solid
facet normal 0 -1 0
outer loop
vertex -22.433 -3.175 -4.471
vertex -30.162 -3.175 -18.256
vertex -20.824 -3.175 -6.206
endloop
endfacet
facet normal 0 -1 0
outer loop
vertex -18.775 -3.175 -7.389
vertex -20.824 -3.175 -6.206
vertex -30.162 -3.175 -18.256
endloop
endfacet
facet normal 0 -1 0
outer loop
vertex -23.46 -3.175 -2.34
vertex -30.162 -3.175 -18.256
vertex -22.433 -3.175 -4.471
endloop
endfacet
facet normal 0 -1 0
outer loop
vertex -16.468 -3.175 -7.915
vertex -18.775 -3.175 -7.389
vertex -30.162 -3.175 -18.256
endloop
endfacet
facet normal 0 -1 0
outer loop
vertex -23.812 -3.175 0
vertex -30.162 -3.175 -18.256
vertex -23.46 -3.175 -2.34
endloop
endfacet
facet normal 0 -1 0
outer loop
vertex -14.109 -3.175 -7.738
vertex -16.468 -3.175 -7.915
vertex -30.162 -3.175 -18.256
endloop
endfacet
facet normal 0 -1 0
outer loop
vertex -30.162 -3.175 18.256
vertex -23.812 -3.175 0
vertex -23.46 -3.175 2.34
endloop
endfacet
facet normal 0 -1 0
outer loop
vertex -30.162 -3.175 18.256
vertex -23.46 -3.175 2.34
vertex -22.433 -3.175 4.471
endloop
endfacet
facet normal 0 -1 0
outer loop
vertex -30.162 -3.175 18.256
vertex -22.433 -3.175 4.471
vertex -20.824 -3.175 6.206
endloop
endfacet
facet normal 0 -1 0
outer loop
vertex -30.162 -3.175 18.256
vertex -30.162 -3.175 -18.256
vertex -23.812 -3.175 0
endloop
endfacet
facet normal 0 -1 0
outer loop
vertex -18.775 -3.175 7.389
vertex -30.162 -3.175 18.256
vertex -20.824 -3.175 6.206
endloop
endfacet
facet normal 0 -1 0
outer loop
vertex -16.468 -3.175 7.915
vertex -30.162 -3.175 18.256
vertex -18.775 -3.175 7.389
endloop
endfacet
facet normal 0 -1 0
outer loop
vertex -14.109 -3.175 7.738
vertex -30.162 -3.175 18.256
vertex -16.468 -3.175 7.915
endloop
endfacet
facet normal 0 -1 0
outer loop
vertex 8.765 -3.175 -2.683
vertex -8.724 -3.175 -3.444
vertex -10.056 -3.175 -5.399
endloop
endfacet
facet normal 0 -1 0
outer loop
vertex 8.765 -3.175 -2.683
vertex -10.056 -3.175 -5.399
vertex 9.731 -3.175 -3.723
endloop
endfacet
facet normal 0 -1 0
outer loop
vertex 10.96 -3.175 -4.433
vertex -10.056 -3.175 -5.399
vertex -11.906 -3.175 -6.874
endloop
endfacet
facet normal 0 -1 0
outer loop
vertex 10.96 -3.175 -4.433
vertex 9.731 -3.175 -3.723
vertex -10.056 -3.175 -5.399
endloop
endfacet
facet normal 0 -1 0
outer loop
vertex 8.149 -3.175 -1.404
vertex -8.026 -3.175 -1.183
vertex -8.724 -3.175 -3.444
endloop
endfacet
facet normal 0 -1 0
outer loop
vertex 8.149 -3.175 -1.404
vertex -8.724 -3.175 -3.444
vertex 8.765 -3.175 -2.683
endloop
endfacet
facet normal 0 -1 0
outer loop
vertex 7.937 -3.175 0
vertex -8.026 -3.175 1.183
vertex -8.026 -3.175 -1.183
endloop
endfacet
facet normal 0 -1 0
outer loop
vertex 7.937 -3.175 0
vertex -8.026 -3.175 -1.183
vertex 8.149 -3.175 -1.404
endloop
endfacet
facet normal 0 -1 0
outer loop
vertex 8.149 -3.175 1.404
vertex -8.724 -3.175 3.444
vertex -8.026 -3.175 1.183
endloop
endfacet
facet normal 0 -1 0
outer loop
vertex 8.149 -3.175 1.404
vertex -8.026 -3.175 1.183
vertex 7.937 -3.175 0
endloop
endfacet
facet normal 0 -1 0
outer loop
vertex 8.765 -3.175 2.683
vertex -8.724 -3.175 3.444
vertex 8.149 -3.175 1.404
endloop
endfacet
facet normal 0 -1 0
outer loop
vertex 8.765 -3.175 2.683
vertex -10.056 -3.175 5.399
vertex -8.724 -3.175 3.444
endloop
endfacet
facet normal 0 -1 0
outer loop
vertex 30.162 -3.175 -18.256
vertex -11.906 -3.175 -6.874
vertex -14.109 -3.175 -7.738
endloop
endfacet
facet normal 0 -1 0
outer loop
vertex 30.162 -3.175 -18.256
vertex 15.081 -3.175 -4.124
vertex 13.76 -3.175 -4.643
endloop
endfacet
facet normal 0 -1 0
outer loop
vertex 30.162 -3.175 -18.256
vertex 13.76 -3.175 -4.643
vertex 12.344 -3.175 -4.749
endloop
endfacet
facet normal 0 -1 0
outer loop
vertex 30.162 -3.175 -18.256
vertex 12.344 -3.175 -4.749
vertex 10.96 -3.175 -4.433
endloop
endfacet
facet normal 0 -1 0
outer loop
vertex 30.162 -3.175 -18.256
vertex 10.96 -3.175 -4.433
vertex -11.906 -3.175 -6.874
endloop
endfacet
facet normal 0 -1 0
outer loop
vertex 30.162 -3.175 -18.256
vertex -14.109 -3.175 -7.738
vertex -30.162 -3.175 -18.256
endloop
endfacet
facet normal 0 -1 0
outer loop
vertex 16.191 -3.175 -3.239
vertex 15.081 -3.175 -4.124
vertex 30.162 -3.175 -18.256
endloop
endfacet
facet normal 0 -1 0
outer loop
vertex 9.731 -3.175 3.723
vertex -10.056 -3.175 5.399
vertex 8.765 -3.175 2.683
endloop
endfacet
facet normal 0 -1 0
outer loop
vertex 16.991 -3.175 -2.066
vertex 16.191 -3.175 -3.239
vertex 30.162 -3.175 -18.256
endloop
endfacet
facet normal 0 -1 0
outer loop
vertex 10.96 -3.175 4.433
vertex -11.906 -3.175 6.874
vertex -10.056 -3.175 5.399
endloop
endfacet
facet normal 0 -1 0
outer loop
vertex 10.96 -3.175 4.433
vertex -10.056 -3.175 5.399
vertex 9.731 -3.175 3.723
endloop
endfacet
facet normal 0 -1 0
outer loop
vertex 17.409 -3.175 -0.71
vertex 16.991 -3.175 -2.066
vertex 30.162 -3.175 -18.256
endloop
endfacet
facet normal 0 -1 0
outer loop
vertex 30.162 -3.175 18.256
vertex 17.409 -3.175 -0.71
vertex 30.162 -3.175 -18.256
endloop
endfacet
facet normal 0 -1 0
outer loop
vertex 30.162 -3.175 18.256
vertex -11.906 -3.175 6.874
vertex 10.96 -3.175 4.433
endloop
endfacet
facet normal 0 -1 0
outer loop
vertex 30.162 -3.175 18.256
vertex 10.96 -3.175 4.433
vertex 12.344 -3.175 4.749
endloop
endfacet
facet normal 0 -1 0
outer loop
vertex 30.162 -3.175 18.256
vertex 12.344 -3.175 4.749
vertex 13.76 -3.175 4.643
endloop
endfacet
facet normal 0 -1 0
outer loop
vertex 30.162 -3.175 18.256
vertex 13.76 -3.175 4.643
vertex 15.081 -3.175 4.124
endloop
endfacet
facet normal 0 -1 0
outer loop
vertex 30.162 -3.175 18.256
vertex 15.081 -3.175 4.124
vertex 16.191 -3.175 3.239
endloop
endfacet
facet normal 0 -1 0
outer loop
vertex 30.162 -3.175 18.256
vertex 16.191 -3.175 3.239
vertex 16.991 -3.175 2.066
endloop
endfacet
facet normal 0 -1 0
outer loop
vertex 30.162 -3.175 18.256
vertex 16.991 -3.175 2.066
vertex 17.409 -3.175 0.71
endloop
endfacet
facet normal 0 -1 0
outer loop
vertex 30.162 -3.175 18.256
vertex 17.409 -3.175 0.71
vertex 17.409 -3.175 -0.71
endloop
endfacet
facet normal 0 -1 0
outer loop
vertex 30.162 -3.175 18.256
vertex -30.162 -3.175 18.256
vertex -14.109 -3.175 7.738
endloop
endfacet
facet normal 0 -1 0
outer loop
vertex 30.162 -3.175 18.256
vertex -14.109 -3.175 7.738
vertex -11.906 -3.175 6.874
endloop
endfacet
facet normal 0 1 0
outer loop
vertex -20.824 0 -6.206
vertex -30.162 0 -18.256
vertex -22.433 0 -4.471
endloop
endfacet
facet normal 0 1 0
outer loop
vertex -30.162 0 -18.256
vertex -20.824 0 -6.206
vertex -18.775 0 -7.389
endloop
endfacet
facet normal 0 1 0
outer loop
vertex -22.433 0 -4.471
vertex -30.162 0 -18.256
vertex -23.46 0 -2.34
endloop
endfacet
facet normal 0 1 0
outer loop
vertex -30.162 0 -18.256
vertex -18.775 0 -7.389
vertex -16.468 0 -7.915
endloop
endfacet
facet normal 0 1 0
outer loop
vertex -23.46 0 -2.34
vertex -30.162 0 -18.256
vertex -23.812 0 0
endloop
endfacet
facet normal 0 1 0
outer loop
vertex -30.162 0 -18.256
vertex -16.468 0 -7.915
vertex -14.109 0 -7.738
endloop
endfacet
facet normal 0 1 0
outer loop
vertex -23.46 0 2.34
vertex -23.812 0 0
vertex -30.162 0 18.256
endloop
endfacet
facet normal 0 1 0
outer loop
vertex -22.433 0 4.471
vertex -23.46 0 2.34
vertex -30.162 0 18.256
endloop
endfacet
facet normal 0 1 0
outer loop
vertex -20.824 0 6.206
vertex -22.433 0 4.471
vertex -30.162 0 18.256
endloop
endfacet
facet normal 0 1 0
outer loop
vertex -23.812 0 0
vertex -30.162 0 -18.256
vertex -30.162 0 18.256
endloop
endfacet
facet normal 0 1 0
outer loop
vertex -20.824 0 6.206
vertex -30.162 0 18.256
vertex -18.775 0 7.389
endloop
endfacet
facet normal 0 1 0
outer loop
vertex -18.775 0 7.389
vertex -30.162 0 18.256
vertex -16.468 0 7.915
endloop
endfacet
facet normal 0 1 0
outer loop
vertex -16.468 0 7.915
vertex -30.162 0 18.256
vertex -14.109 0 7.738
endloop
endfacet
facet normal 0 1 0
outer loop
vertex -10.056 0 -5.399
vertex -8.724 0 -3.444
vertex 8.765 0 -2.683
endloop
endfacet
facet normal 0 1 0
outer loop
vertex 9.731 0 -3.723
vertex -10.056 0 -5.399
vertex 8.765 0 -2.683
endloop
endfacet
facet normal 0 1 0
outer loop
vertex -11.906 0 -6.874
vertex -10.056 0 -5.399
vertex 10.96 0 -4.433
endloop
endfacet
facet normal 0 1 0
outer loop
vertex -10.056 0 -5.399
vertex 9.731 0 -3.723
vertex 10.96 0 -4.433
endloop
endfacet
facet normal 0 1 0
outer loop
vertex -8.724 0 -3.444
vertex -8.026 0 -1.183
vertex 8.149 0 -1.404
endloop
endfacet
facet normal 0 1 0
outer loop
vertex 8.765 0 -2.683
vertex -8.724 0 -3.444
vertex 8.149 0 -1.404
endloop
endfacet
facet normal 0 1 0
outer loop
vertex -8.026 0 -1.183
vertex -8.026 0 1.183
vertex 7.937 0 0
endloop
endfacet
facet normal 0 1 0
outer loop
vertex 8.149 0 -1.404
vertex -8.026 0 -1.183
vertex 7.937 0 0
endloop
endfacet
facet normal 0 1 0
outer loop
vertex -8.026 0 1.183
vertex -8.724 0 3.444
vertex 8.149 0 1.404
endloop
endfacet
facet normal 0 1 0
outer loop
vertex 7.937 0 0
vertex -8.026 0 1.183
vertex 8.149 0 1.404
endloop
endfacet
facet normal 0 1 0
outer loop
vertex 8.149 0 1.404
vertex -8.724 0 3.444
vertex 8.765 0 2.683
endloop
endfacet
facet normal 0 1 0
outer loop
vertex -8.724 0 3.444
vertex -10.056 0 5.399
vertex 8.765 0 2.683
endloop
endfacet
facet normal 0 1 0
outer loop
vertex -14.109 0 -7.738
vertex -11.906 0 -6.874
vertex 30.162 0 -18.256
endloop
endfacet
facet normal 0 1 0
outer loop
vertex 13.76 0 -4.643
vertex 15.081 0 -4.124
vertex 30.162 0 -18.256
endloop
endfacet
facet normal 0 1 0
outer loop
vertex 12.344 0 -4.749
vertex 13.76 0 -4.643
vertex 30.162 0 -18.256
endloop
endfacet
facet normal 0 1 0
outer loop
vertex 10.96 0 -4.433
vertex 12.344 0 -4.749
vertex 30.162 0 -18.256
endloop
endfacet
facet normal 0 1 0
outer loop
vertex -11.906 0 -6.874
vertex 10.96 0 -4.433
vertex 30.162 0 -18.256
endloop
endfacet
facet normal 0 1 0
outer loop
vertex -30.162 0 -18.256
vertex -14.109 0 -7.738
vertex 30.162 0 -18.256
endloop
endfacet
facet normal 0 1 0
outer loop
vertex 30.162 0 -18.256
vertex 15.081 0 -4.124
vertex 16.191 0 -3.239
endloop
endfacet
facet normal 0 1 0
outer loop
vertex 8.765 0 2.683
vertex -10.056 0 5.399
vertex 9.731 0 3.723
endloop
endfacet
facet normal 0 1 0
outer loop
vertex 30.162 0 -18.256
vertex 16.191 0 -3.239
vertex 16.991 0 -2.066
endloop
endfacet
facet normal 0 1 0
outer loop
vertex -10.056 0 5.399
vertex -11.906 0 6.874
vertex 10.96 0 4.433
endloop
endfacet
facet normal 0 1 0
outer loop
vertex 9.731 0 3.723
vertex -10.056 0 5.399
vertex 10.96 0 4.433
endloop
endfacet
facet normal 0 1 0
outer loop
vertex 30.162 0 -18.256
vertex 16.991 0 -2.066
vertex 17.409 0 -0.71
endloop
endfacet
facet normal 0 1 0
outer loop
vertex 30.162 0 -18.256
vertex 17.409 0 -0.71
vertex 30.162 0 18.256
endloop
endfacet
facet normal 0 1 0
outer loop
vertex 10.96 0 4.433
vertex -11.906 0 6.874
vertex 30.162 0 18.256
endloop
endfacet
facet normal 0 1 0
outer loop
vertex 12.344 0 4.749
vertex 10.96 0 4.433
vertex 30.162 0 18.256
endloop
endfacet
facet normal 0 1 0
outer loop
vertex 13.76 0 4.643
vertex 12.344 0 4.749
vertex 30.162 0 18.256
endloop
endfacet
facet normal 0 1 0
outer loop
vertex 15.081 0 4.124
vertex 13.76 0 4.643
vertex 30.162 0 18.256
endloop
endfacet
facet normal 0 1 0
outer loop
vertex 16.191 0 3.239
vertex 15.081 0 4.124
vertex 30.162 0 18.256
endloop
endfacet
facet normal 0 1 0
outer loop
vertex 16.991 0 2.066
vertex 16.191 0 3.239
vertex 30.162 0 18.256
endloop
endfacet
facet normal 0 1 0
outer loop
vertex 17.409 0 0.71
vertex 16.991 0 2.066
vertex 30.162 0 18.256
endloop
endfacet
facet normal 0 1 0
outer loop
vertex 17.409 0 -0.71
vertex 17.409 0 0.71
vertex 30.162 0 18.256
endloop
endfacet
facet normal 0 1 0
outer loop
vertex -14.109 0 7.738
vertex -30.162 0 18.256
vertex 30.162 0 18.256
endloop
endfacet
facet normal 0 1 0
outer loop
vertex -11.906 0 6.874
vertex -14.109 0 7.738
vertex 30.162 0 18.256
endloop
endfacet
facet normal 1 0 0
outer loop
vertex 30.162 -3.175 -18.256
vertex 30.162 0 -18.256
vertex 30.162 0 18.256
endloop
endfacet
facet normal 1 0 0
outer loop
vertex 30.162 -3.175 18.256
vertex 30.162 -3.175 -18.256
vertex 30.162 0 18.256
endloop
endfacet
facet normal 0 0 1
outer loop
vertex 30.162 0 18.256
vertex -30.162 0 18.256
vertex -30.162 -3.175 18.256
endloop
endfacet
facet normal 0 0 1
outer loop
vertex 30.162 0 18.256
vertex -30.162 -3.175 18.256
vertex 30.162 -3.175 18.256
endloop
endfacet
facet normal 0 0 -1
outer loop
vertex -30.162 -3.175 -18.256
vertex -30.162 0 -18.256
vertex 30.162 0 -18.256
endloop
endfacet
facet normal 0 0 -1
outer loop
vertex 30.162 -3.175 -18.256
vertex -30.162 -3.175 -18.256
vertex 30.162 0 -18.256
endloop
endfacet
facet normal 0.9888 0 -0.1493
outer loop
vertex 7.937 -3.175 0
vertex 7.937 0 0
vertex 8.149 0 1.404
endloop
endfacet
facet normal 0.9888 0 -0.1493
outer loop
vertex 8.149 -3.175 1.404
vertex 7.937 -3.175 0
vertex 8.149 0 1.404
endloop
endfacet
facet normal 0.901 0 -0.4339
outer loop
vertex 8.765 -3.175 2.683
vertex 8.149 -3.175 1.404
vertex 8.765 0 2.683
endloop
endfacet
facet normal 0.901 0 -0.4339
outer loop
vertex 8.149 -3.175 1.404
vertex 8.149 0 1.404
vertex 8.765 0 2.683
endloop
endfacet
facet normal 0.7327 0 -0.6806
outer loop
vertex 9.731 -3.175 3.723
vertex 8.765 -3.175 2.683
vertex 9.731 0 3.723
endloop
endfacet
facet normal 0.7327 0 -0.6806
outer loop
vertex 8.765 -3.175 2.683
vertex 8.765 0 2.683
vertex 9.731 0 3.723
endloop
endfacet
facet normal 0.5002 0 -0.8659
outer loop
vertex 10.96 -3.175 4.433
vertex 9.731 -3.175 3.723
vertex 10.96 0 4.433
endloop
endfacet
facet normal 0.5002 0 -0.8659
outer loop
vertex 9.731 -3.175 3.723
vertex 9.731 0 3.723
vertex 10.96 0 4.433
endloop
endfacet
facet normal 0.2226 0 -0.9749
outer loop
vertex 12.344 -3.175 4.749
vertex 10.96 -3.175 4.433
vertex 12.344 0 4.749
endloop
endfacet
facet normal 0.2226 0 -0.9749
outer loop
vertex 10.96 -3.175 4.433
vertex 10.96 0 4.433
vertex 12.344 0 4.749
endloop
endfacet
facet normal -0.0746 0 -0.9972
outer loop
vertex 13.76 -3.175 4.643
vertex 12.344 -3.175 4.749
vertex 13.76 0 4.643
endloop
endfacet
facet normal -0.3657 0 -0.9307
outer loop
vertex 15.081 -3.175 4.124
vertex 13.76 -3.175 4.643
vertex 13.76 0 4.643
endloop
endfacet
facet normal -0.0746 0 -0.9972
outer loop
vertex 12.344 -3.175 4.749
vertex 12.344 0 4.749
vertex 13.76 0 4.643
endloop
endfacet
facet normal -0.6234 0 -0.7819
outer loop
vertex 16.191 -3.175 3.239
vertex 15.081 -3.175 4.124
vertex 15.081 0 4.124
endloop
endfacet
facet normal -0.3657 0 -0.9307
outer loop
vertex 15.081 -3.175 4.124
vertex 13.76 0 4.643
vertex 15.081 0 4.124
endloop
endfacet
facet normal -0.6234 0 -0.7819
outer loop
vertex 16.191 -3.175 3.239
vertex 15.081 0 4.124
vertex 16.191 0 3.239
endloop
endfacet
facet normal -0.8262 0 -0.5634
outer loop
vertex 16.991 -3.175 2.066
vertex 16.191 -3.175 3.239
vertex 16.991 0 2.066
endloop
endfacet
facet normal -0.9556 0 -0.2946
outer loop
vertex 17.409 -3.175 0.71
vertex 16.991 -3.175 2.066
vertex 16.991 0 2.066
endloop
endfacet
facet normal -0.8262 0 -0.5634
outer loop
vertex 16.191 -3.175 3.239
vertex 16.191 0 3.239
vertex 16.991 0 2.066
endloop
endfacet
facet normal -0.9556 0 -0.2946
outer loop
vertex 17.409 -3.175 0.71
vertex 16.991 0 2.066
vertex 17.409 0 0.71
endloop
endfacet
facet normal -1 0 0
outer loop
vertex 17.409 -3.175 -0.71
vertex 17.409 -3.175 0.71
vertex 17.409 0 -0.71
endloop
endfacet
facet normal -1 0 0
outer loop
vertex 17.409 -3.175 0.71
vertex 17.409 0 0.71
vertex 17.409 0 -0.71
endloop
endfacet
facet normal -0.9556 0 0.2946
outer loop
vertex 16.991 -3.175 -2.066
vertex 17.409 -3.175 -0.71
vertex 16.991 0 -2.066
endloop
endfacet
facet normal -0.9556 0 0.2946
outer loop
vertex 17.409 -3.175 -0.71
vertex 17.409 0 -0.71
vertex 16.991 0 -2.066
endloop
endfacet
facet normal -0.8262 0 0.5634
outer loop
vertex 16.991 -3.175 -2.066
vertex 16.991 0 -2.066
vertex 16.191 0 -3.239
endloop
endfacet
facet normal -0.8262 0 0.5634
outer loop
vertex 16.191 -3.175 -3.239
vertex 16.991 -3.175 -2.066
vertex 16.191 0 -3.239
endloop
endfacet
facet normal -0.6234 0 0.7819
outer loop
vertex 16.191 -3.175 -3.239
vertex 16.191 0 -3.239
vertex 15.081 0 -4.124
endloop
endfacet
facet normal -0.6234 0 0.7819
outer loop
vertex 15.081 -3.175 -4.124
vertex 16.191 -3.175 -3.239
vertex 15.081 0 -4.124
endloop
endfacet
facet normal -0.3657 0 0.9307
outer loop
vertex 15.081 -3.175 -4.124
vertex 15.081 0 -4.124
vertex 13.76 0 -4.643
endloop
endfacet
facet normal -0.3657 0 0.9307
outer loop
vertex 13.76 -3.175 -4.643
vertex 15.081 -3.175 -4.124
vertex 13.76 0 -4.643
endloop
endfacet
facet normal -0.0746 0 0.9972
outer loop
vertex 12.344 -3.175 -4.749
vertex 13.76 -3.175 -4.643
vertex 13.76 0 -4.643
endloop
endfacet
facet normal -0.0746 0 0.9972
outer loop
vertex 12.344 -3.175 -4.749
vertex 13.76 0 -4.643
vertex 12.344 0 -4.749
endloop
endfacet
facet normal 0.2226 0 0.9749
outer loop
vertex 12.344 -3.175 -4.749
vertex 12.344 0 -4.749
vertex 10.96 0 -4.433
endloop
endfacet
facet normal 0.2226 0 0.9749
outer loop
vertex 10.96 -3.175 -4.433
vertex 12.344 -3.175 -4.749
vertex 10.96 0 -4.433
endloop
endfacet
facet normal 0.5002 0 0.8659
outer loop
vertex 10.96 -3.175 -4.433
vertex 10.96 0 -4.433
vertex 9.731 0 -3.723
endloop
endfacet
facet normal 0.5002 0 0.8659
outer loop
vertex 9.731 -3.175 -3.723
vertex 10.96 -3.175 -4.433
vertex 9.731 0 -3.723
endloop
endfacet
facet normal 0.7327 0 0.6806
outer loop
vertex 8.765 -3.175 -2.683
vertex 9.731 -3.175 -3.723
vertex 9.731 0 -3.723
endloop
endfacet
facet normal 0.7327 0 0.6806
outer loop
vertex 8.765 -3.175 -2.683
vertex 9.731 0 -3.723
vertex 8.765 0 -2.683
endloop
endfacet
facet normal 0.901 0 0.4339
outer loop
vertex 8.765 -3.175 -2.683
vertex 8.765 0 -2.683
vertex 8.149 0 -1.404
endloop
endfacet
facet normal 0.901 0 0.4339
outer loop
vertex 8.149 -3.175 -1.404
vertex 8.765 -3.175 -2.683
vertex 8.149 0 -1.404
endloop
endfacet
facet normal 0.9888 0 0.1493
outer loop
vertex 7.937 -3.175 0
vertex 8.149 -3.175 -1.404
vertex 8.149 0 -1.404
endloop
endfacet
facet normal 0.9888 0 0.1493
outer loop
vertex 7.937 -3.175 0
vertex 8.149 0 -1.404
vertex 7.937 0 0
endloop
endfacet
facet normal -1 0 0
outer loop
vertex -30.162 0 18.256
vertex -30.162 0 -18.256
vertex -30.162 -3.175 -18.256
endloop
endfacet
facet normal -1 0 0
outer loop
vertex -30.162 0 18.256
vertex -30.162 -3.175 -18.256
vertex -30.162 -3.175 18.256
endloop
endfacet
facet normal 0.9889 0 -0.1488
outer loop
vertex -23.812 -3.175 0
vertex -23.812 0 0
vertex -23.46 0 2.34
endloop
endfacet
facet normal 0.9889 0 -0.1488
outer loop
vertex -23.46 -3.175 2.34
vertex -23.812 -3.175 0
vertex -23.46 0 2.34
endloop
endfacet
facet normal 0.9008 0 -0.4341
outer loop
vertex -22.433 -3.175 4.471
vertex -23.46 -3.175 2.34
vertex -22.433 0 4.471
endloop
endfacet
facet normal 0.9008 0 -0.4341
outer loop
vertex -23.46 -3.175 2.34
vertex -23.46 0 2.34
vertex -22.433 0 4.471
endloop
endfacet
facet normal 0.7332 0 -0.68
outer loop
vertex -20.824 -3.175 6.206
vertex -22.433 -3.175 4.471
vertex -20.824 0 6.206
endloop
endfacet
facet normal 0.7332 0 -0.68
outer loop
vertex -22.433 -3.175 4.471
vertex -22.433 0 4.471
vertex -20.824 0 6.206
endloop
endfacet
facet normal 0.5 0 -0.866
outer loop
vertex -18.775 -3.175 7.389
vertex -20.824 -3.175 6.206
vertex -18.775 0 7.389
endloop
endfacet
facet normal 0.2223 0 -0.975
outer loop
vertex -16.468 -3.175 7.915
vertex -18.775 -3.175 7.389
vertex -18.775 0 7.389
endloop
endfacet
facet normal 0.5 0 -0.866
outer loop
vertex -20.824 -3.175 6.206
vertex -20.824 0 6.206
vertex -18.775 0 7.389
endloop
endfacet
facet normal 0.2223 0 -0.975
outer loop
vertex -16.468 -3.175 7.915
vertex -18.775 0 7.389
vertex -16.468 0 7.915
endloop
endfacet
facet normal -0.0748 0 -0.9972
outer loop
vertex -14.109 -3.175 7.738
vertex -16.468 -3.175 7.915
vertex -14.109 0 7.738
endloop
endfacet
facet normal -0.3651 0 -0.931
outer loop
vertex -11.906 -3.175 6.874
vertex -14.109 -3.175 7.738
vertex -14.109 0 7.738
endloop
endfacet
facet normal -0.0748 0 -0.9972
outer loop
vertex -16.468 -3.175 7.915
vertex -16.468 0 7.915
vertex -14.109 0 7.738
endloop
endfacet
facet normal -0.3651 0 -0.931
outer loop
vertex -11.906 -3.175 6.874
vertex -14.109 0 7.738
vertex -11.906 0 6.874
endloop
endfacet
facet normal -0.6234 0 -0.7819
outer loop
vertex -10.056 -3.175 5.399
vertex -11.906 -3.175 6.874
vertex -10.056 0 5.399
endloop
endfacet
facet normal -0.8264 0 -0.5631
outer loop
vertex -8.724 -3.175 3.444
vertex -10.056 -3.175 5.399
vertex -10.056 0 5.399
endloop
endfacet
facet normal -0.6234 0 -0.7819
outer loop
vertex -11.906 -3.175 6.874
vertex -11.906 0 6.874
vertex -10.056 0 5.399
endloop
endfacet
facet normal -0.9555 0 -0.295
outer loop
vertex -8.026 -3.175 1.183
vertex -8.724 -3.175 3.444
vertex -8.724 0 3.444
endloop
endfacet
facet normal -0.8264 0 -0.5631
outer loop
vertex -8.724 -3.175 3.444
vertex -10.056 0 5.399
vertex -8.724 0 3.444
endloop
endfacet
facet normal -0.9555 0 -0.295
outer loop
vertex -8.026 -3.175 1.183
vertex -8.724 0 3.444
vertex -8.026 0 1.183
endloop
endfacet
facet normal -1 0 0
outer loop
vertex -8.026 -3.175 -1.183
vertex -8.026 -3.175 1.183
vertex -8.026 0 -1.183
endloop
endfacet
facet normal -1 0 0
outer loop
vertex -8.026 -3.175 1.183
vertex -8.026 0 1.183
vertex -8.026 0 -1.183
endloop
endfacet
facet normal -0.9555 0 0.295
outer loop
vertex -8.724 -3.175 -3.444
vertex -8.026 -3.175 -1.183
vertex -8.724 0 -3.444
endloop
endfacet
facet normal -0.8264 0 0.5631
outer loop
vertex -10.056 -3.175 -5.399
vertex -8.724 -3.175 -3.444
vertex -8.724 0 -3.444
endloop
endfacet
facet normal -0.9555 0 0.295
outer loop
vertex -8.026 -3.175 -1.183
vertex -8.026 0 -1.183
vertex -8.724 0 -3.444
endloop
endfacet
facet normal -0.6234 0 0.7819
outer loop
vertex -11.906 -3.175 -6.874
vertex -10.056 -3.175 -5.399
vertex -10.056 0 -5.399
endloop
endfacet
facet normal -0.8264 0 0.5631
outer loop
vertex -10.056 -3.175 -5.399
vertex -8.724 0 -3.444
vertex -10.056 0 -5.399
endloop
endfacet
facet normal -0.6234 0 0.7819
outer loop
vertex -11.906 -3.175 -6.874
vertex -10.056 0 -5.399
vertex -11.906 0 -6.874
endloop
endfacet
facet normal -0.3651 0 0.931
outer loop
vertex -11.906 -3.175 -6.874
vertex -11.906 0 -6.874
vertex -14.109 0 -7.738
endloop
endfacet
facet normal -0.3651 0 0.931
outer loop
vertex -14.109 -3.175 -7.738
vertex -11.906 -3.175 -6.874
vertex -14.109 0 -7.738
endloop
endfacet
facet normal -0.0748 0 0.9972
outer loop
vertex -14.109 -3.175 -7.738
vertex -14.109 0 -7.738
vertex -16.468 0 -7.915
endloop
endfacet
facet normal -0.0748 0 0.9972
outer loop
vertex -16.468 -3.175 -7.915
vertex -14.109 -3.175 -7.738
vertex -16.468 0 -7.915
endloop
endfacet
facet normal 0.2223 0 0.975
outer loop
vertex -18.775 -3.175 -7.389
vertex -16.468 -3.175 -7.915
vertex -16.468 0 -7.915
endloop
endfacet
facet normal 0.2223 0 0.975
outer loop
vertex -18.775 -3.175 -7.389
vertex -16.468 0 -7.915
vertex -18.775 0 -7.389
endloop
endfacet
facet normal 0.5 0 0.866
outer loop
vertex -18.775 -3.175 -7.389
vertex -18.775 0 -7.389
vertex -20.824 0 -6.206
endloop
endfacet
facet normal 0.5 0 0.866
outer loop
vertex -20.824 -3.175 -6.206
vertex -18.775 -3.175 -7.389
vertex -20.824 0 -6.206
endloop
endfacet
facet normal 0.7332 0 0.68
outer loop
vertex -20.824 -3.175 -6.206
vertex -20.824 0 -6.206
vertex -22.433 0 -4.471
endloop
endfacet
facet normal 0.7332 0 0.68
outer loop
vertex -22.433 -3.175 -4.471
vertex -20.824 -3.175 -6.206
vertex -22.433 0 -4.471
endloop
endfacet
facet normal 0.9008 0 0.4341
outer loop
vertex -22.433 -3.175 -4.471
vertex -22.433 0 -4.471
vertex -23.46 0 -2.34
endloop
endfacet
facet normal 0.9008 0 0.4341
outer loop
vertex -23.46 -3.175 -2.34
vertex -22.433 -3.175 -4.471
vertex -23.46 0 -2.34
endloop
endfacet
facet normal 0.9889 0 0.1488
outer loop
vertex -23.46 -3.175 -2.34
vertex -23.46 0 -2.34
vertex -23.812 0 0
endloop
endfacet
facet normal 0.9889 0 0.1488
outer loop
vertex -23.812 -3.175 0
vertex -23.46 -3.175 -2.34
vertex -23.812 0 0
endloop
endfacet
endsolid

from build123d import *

# Parameters (mm, degrees)
F0_W     = 60.325
F0_H     = 36.5125
F1_DEPTH = 3.175
F3_D     = 15.875
F5_D     = 9.525


with BuildPart() as f1:
    # F0 (on Front) → F1 (new body)
    with BuildSketch(Plane.XZ):
        Rectangle(F0_W, F0_H)
    extrude(amount=F1_DEPTH)

    # F3 (through all)
    with Locations(Plane.XZ.offset(3.175)):
        with Locations((-15.875, 0)):
            Hole(F3_D / 2)

    # F5 (through all)
    with Locations(Plane.XZ.offset(3.175)):
        with Locations((12.7, 0)):
            Hole(F5_D / 2)


solid = f1.part
